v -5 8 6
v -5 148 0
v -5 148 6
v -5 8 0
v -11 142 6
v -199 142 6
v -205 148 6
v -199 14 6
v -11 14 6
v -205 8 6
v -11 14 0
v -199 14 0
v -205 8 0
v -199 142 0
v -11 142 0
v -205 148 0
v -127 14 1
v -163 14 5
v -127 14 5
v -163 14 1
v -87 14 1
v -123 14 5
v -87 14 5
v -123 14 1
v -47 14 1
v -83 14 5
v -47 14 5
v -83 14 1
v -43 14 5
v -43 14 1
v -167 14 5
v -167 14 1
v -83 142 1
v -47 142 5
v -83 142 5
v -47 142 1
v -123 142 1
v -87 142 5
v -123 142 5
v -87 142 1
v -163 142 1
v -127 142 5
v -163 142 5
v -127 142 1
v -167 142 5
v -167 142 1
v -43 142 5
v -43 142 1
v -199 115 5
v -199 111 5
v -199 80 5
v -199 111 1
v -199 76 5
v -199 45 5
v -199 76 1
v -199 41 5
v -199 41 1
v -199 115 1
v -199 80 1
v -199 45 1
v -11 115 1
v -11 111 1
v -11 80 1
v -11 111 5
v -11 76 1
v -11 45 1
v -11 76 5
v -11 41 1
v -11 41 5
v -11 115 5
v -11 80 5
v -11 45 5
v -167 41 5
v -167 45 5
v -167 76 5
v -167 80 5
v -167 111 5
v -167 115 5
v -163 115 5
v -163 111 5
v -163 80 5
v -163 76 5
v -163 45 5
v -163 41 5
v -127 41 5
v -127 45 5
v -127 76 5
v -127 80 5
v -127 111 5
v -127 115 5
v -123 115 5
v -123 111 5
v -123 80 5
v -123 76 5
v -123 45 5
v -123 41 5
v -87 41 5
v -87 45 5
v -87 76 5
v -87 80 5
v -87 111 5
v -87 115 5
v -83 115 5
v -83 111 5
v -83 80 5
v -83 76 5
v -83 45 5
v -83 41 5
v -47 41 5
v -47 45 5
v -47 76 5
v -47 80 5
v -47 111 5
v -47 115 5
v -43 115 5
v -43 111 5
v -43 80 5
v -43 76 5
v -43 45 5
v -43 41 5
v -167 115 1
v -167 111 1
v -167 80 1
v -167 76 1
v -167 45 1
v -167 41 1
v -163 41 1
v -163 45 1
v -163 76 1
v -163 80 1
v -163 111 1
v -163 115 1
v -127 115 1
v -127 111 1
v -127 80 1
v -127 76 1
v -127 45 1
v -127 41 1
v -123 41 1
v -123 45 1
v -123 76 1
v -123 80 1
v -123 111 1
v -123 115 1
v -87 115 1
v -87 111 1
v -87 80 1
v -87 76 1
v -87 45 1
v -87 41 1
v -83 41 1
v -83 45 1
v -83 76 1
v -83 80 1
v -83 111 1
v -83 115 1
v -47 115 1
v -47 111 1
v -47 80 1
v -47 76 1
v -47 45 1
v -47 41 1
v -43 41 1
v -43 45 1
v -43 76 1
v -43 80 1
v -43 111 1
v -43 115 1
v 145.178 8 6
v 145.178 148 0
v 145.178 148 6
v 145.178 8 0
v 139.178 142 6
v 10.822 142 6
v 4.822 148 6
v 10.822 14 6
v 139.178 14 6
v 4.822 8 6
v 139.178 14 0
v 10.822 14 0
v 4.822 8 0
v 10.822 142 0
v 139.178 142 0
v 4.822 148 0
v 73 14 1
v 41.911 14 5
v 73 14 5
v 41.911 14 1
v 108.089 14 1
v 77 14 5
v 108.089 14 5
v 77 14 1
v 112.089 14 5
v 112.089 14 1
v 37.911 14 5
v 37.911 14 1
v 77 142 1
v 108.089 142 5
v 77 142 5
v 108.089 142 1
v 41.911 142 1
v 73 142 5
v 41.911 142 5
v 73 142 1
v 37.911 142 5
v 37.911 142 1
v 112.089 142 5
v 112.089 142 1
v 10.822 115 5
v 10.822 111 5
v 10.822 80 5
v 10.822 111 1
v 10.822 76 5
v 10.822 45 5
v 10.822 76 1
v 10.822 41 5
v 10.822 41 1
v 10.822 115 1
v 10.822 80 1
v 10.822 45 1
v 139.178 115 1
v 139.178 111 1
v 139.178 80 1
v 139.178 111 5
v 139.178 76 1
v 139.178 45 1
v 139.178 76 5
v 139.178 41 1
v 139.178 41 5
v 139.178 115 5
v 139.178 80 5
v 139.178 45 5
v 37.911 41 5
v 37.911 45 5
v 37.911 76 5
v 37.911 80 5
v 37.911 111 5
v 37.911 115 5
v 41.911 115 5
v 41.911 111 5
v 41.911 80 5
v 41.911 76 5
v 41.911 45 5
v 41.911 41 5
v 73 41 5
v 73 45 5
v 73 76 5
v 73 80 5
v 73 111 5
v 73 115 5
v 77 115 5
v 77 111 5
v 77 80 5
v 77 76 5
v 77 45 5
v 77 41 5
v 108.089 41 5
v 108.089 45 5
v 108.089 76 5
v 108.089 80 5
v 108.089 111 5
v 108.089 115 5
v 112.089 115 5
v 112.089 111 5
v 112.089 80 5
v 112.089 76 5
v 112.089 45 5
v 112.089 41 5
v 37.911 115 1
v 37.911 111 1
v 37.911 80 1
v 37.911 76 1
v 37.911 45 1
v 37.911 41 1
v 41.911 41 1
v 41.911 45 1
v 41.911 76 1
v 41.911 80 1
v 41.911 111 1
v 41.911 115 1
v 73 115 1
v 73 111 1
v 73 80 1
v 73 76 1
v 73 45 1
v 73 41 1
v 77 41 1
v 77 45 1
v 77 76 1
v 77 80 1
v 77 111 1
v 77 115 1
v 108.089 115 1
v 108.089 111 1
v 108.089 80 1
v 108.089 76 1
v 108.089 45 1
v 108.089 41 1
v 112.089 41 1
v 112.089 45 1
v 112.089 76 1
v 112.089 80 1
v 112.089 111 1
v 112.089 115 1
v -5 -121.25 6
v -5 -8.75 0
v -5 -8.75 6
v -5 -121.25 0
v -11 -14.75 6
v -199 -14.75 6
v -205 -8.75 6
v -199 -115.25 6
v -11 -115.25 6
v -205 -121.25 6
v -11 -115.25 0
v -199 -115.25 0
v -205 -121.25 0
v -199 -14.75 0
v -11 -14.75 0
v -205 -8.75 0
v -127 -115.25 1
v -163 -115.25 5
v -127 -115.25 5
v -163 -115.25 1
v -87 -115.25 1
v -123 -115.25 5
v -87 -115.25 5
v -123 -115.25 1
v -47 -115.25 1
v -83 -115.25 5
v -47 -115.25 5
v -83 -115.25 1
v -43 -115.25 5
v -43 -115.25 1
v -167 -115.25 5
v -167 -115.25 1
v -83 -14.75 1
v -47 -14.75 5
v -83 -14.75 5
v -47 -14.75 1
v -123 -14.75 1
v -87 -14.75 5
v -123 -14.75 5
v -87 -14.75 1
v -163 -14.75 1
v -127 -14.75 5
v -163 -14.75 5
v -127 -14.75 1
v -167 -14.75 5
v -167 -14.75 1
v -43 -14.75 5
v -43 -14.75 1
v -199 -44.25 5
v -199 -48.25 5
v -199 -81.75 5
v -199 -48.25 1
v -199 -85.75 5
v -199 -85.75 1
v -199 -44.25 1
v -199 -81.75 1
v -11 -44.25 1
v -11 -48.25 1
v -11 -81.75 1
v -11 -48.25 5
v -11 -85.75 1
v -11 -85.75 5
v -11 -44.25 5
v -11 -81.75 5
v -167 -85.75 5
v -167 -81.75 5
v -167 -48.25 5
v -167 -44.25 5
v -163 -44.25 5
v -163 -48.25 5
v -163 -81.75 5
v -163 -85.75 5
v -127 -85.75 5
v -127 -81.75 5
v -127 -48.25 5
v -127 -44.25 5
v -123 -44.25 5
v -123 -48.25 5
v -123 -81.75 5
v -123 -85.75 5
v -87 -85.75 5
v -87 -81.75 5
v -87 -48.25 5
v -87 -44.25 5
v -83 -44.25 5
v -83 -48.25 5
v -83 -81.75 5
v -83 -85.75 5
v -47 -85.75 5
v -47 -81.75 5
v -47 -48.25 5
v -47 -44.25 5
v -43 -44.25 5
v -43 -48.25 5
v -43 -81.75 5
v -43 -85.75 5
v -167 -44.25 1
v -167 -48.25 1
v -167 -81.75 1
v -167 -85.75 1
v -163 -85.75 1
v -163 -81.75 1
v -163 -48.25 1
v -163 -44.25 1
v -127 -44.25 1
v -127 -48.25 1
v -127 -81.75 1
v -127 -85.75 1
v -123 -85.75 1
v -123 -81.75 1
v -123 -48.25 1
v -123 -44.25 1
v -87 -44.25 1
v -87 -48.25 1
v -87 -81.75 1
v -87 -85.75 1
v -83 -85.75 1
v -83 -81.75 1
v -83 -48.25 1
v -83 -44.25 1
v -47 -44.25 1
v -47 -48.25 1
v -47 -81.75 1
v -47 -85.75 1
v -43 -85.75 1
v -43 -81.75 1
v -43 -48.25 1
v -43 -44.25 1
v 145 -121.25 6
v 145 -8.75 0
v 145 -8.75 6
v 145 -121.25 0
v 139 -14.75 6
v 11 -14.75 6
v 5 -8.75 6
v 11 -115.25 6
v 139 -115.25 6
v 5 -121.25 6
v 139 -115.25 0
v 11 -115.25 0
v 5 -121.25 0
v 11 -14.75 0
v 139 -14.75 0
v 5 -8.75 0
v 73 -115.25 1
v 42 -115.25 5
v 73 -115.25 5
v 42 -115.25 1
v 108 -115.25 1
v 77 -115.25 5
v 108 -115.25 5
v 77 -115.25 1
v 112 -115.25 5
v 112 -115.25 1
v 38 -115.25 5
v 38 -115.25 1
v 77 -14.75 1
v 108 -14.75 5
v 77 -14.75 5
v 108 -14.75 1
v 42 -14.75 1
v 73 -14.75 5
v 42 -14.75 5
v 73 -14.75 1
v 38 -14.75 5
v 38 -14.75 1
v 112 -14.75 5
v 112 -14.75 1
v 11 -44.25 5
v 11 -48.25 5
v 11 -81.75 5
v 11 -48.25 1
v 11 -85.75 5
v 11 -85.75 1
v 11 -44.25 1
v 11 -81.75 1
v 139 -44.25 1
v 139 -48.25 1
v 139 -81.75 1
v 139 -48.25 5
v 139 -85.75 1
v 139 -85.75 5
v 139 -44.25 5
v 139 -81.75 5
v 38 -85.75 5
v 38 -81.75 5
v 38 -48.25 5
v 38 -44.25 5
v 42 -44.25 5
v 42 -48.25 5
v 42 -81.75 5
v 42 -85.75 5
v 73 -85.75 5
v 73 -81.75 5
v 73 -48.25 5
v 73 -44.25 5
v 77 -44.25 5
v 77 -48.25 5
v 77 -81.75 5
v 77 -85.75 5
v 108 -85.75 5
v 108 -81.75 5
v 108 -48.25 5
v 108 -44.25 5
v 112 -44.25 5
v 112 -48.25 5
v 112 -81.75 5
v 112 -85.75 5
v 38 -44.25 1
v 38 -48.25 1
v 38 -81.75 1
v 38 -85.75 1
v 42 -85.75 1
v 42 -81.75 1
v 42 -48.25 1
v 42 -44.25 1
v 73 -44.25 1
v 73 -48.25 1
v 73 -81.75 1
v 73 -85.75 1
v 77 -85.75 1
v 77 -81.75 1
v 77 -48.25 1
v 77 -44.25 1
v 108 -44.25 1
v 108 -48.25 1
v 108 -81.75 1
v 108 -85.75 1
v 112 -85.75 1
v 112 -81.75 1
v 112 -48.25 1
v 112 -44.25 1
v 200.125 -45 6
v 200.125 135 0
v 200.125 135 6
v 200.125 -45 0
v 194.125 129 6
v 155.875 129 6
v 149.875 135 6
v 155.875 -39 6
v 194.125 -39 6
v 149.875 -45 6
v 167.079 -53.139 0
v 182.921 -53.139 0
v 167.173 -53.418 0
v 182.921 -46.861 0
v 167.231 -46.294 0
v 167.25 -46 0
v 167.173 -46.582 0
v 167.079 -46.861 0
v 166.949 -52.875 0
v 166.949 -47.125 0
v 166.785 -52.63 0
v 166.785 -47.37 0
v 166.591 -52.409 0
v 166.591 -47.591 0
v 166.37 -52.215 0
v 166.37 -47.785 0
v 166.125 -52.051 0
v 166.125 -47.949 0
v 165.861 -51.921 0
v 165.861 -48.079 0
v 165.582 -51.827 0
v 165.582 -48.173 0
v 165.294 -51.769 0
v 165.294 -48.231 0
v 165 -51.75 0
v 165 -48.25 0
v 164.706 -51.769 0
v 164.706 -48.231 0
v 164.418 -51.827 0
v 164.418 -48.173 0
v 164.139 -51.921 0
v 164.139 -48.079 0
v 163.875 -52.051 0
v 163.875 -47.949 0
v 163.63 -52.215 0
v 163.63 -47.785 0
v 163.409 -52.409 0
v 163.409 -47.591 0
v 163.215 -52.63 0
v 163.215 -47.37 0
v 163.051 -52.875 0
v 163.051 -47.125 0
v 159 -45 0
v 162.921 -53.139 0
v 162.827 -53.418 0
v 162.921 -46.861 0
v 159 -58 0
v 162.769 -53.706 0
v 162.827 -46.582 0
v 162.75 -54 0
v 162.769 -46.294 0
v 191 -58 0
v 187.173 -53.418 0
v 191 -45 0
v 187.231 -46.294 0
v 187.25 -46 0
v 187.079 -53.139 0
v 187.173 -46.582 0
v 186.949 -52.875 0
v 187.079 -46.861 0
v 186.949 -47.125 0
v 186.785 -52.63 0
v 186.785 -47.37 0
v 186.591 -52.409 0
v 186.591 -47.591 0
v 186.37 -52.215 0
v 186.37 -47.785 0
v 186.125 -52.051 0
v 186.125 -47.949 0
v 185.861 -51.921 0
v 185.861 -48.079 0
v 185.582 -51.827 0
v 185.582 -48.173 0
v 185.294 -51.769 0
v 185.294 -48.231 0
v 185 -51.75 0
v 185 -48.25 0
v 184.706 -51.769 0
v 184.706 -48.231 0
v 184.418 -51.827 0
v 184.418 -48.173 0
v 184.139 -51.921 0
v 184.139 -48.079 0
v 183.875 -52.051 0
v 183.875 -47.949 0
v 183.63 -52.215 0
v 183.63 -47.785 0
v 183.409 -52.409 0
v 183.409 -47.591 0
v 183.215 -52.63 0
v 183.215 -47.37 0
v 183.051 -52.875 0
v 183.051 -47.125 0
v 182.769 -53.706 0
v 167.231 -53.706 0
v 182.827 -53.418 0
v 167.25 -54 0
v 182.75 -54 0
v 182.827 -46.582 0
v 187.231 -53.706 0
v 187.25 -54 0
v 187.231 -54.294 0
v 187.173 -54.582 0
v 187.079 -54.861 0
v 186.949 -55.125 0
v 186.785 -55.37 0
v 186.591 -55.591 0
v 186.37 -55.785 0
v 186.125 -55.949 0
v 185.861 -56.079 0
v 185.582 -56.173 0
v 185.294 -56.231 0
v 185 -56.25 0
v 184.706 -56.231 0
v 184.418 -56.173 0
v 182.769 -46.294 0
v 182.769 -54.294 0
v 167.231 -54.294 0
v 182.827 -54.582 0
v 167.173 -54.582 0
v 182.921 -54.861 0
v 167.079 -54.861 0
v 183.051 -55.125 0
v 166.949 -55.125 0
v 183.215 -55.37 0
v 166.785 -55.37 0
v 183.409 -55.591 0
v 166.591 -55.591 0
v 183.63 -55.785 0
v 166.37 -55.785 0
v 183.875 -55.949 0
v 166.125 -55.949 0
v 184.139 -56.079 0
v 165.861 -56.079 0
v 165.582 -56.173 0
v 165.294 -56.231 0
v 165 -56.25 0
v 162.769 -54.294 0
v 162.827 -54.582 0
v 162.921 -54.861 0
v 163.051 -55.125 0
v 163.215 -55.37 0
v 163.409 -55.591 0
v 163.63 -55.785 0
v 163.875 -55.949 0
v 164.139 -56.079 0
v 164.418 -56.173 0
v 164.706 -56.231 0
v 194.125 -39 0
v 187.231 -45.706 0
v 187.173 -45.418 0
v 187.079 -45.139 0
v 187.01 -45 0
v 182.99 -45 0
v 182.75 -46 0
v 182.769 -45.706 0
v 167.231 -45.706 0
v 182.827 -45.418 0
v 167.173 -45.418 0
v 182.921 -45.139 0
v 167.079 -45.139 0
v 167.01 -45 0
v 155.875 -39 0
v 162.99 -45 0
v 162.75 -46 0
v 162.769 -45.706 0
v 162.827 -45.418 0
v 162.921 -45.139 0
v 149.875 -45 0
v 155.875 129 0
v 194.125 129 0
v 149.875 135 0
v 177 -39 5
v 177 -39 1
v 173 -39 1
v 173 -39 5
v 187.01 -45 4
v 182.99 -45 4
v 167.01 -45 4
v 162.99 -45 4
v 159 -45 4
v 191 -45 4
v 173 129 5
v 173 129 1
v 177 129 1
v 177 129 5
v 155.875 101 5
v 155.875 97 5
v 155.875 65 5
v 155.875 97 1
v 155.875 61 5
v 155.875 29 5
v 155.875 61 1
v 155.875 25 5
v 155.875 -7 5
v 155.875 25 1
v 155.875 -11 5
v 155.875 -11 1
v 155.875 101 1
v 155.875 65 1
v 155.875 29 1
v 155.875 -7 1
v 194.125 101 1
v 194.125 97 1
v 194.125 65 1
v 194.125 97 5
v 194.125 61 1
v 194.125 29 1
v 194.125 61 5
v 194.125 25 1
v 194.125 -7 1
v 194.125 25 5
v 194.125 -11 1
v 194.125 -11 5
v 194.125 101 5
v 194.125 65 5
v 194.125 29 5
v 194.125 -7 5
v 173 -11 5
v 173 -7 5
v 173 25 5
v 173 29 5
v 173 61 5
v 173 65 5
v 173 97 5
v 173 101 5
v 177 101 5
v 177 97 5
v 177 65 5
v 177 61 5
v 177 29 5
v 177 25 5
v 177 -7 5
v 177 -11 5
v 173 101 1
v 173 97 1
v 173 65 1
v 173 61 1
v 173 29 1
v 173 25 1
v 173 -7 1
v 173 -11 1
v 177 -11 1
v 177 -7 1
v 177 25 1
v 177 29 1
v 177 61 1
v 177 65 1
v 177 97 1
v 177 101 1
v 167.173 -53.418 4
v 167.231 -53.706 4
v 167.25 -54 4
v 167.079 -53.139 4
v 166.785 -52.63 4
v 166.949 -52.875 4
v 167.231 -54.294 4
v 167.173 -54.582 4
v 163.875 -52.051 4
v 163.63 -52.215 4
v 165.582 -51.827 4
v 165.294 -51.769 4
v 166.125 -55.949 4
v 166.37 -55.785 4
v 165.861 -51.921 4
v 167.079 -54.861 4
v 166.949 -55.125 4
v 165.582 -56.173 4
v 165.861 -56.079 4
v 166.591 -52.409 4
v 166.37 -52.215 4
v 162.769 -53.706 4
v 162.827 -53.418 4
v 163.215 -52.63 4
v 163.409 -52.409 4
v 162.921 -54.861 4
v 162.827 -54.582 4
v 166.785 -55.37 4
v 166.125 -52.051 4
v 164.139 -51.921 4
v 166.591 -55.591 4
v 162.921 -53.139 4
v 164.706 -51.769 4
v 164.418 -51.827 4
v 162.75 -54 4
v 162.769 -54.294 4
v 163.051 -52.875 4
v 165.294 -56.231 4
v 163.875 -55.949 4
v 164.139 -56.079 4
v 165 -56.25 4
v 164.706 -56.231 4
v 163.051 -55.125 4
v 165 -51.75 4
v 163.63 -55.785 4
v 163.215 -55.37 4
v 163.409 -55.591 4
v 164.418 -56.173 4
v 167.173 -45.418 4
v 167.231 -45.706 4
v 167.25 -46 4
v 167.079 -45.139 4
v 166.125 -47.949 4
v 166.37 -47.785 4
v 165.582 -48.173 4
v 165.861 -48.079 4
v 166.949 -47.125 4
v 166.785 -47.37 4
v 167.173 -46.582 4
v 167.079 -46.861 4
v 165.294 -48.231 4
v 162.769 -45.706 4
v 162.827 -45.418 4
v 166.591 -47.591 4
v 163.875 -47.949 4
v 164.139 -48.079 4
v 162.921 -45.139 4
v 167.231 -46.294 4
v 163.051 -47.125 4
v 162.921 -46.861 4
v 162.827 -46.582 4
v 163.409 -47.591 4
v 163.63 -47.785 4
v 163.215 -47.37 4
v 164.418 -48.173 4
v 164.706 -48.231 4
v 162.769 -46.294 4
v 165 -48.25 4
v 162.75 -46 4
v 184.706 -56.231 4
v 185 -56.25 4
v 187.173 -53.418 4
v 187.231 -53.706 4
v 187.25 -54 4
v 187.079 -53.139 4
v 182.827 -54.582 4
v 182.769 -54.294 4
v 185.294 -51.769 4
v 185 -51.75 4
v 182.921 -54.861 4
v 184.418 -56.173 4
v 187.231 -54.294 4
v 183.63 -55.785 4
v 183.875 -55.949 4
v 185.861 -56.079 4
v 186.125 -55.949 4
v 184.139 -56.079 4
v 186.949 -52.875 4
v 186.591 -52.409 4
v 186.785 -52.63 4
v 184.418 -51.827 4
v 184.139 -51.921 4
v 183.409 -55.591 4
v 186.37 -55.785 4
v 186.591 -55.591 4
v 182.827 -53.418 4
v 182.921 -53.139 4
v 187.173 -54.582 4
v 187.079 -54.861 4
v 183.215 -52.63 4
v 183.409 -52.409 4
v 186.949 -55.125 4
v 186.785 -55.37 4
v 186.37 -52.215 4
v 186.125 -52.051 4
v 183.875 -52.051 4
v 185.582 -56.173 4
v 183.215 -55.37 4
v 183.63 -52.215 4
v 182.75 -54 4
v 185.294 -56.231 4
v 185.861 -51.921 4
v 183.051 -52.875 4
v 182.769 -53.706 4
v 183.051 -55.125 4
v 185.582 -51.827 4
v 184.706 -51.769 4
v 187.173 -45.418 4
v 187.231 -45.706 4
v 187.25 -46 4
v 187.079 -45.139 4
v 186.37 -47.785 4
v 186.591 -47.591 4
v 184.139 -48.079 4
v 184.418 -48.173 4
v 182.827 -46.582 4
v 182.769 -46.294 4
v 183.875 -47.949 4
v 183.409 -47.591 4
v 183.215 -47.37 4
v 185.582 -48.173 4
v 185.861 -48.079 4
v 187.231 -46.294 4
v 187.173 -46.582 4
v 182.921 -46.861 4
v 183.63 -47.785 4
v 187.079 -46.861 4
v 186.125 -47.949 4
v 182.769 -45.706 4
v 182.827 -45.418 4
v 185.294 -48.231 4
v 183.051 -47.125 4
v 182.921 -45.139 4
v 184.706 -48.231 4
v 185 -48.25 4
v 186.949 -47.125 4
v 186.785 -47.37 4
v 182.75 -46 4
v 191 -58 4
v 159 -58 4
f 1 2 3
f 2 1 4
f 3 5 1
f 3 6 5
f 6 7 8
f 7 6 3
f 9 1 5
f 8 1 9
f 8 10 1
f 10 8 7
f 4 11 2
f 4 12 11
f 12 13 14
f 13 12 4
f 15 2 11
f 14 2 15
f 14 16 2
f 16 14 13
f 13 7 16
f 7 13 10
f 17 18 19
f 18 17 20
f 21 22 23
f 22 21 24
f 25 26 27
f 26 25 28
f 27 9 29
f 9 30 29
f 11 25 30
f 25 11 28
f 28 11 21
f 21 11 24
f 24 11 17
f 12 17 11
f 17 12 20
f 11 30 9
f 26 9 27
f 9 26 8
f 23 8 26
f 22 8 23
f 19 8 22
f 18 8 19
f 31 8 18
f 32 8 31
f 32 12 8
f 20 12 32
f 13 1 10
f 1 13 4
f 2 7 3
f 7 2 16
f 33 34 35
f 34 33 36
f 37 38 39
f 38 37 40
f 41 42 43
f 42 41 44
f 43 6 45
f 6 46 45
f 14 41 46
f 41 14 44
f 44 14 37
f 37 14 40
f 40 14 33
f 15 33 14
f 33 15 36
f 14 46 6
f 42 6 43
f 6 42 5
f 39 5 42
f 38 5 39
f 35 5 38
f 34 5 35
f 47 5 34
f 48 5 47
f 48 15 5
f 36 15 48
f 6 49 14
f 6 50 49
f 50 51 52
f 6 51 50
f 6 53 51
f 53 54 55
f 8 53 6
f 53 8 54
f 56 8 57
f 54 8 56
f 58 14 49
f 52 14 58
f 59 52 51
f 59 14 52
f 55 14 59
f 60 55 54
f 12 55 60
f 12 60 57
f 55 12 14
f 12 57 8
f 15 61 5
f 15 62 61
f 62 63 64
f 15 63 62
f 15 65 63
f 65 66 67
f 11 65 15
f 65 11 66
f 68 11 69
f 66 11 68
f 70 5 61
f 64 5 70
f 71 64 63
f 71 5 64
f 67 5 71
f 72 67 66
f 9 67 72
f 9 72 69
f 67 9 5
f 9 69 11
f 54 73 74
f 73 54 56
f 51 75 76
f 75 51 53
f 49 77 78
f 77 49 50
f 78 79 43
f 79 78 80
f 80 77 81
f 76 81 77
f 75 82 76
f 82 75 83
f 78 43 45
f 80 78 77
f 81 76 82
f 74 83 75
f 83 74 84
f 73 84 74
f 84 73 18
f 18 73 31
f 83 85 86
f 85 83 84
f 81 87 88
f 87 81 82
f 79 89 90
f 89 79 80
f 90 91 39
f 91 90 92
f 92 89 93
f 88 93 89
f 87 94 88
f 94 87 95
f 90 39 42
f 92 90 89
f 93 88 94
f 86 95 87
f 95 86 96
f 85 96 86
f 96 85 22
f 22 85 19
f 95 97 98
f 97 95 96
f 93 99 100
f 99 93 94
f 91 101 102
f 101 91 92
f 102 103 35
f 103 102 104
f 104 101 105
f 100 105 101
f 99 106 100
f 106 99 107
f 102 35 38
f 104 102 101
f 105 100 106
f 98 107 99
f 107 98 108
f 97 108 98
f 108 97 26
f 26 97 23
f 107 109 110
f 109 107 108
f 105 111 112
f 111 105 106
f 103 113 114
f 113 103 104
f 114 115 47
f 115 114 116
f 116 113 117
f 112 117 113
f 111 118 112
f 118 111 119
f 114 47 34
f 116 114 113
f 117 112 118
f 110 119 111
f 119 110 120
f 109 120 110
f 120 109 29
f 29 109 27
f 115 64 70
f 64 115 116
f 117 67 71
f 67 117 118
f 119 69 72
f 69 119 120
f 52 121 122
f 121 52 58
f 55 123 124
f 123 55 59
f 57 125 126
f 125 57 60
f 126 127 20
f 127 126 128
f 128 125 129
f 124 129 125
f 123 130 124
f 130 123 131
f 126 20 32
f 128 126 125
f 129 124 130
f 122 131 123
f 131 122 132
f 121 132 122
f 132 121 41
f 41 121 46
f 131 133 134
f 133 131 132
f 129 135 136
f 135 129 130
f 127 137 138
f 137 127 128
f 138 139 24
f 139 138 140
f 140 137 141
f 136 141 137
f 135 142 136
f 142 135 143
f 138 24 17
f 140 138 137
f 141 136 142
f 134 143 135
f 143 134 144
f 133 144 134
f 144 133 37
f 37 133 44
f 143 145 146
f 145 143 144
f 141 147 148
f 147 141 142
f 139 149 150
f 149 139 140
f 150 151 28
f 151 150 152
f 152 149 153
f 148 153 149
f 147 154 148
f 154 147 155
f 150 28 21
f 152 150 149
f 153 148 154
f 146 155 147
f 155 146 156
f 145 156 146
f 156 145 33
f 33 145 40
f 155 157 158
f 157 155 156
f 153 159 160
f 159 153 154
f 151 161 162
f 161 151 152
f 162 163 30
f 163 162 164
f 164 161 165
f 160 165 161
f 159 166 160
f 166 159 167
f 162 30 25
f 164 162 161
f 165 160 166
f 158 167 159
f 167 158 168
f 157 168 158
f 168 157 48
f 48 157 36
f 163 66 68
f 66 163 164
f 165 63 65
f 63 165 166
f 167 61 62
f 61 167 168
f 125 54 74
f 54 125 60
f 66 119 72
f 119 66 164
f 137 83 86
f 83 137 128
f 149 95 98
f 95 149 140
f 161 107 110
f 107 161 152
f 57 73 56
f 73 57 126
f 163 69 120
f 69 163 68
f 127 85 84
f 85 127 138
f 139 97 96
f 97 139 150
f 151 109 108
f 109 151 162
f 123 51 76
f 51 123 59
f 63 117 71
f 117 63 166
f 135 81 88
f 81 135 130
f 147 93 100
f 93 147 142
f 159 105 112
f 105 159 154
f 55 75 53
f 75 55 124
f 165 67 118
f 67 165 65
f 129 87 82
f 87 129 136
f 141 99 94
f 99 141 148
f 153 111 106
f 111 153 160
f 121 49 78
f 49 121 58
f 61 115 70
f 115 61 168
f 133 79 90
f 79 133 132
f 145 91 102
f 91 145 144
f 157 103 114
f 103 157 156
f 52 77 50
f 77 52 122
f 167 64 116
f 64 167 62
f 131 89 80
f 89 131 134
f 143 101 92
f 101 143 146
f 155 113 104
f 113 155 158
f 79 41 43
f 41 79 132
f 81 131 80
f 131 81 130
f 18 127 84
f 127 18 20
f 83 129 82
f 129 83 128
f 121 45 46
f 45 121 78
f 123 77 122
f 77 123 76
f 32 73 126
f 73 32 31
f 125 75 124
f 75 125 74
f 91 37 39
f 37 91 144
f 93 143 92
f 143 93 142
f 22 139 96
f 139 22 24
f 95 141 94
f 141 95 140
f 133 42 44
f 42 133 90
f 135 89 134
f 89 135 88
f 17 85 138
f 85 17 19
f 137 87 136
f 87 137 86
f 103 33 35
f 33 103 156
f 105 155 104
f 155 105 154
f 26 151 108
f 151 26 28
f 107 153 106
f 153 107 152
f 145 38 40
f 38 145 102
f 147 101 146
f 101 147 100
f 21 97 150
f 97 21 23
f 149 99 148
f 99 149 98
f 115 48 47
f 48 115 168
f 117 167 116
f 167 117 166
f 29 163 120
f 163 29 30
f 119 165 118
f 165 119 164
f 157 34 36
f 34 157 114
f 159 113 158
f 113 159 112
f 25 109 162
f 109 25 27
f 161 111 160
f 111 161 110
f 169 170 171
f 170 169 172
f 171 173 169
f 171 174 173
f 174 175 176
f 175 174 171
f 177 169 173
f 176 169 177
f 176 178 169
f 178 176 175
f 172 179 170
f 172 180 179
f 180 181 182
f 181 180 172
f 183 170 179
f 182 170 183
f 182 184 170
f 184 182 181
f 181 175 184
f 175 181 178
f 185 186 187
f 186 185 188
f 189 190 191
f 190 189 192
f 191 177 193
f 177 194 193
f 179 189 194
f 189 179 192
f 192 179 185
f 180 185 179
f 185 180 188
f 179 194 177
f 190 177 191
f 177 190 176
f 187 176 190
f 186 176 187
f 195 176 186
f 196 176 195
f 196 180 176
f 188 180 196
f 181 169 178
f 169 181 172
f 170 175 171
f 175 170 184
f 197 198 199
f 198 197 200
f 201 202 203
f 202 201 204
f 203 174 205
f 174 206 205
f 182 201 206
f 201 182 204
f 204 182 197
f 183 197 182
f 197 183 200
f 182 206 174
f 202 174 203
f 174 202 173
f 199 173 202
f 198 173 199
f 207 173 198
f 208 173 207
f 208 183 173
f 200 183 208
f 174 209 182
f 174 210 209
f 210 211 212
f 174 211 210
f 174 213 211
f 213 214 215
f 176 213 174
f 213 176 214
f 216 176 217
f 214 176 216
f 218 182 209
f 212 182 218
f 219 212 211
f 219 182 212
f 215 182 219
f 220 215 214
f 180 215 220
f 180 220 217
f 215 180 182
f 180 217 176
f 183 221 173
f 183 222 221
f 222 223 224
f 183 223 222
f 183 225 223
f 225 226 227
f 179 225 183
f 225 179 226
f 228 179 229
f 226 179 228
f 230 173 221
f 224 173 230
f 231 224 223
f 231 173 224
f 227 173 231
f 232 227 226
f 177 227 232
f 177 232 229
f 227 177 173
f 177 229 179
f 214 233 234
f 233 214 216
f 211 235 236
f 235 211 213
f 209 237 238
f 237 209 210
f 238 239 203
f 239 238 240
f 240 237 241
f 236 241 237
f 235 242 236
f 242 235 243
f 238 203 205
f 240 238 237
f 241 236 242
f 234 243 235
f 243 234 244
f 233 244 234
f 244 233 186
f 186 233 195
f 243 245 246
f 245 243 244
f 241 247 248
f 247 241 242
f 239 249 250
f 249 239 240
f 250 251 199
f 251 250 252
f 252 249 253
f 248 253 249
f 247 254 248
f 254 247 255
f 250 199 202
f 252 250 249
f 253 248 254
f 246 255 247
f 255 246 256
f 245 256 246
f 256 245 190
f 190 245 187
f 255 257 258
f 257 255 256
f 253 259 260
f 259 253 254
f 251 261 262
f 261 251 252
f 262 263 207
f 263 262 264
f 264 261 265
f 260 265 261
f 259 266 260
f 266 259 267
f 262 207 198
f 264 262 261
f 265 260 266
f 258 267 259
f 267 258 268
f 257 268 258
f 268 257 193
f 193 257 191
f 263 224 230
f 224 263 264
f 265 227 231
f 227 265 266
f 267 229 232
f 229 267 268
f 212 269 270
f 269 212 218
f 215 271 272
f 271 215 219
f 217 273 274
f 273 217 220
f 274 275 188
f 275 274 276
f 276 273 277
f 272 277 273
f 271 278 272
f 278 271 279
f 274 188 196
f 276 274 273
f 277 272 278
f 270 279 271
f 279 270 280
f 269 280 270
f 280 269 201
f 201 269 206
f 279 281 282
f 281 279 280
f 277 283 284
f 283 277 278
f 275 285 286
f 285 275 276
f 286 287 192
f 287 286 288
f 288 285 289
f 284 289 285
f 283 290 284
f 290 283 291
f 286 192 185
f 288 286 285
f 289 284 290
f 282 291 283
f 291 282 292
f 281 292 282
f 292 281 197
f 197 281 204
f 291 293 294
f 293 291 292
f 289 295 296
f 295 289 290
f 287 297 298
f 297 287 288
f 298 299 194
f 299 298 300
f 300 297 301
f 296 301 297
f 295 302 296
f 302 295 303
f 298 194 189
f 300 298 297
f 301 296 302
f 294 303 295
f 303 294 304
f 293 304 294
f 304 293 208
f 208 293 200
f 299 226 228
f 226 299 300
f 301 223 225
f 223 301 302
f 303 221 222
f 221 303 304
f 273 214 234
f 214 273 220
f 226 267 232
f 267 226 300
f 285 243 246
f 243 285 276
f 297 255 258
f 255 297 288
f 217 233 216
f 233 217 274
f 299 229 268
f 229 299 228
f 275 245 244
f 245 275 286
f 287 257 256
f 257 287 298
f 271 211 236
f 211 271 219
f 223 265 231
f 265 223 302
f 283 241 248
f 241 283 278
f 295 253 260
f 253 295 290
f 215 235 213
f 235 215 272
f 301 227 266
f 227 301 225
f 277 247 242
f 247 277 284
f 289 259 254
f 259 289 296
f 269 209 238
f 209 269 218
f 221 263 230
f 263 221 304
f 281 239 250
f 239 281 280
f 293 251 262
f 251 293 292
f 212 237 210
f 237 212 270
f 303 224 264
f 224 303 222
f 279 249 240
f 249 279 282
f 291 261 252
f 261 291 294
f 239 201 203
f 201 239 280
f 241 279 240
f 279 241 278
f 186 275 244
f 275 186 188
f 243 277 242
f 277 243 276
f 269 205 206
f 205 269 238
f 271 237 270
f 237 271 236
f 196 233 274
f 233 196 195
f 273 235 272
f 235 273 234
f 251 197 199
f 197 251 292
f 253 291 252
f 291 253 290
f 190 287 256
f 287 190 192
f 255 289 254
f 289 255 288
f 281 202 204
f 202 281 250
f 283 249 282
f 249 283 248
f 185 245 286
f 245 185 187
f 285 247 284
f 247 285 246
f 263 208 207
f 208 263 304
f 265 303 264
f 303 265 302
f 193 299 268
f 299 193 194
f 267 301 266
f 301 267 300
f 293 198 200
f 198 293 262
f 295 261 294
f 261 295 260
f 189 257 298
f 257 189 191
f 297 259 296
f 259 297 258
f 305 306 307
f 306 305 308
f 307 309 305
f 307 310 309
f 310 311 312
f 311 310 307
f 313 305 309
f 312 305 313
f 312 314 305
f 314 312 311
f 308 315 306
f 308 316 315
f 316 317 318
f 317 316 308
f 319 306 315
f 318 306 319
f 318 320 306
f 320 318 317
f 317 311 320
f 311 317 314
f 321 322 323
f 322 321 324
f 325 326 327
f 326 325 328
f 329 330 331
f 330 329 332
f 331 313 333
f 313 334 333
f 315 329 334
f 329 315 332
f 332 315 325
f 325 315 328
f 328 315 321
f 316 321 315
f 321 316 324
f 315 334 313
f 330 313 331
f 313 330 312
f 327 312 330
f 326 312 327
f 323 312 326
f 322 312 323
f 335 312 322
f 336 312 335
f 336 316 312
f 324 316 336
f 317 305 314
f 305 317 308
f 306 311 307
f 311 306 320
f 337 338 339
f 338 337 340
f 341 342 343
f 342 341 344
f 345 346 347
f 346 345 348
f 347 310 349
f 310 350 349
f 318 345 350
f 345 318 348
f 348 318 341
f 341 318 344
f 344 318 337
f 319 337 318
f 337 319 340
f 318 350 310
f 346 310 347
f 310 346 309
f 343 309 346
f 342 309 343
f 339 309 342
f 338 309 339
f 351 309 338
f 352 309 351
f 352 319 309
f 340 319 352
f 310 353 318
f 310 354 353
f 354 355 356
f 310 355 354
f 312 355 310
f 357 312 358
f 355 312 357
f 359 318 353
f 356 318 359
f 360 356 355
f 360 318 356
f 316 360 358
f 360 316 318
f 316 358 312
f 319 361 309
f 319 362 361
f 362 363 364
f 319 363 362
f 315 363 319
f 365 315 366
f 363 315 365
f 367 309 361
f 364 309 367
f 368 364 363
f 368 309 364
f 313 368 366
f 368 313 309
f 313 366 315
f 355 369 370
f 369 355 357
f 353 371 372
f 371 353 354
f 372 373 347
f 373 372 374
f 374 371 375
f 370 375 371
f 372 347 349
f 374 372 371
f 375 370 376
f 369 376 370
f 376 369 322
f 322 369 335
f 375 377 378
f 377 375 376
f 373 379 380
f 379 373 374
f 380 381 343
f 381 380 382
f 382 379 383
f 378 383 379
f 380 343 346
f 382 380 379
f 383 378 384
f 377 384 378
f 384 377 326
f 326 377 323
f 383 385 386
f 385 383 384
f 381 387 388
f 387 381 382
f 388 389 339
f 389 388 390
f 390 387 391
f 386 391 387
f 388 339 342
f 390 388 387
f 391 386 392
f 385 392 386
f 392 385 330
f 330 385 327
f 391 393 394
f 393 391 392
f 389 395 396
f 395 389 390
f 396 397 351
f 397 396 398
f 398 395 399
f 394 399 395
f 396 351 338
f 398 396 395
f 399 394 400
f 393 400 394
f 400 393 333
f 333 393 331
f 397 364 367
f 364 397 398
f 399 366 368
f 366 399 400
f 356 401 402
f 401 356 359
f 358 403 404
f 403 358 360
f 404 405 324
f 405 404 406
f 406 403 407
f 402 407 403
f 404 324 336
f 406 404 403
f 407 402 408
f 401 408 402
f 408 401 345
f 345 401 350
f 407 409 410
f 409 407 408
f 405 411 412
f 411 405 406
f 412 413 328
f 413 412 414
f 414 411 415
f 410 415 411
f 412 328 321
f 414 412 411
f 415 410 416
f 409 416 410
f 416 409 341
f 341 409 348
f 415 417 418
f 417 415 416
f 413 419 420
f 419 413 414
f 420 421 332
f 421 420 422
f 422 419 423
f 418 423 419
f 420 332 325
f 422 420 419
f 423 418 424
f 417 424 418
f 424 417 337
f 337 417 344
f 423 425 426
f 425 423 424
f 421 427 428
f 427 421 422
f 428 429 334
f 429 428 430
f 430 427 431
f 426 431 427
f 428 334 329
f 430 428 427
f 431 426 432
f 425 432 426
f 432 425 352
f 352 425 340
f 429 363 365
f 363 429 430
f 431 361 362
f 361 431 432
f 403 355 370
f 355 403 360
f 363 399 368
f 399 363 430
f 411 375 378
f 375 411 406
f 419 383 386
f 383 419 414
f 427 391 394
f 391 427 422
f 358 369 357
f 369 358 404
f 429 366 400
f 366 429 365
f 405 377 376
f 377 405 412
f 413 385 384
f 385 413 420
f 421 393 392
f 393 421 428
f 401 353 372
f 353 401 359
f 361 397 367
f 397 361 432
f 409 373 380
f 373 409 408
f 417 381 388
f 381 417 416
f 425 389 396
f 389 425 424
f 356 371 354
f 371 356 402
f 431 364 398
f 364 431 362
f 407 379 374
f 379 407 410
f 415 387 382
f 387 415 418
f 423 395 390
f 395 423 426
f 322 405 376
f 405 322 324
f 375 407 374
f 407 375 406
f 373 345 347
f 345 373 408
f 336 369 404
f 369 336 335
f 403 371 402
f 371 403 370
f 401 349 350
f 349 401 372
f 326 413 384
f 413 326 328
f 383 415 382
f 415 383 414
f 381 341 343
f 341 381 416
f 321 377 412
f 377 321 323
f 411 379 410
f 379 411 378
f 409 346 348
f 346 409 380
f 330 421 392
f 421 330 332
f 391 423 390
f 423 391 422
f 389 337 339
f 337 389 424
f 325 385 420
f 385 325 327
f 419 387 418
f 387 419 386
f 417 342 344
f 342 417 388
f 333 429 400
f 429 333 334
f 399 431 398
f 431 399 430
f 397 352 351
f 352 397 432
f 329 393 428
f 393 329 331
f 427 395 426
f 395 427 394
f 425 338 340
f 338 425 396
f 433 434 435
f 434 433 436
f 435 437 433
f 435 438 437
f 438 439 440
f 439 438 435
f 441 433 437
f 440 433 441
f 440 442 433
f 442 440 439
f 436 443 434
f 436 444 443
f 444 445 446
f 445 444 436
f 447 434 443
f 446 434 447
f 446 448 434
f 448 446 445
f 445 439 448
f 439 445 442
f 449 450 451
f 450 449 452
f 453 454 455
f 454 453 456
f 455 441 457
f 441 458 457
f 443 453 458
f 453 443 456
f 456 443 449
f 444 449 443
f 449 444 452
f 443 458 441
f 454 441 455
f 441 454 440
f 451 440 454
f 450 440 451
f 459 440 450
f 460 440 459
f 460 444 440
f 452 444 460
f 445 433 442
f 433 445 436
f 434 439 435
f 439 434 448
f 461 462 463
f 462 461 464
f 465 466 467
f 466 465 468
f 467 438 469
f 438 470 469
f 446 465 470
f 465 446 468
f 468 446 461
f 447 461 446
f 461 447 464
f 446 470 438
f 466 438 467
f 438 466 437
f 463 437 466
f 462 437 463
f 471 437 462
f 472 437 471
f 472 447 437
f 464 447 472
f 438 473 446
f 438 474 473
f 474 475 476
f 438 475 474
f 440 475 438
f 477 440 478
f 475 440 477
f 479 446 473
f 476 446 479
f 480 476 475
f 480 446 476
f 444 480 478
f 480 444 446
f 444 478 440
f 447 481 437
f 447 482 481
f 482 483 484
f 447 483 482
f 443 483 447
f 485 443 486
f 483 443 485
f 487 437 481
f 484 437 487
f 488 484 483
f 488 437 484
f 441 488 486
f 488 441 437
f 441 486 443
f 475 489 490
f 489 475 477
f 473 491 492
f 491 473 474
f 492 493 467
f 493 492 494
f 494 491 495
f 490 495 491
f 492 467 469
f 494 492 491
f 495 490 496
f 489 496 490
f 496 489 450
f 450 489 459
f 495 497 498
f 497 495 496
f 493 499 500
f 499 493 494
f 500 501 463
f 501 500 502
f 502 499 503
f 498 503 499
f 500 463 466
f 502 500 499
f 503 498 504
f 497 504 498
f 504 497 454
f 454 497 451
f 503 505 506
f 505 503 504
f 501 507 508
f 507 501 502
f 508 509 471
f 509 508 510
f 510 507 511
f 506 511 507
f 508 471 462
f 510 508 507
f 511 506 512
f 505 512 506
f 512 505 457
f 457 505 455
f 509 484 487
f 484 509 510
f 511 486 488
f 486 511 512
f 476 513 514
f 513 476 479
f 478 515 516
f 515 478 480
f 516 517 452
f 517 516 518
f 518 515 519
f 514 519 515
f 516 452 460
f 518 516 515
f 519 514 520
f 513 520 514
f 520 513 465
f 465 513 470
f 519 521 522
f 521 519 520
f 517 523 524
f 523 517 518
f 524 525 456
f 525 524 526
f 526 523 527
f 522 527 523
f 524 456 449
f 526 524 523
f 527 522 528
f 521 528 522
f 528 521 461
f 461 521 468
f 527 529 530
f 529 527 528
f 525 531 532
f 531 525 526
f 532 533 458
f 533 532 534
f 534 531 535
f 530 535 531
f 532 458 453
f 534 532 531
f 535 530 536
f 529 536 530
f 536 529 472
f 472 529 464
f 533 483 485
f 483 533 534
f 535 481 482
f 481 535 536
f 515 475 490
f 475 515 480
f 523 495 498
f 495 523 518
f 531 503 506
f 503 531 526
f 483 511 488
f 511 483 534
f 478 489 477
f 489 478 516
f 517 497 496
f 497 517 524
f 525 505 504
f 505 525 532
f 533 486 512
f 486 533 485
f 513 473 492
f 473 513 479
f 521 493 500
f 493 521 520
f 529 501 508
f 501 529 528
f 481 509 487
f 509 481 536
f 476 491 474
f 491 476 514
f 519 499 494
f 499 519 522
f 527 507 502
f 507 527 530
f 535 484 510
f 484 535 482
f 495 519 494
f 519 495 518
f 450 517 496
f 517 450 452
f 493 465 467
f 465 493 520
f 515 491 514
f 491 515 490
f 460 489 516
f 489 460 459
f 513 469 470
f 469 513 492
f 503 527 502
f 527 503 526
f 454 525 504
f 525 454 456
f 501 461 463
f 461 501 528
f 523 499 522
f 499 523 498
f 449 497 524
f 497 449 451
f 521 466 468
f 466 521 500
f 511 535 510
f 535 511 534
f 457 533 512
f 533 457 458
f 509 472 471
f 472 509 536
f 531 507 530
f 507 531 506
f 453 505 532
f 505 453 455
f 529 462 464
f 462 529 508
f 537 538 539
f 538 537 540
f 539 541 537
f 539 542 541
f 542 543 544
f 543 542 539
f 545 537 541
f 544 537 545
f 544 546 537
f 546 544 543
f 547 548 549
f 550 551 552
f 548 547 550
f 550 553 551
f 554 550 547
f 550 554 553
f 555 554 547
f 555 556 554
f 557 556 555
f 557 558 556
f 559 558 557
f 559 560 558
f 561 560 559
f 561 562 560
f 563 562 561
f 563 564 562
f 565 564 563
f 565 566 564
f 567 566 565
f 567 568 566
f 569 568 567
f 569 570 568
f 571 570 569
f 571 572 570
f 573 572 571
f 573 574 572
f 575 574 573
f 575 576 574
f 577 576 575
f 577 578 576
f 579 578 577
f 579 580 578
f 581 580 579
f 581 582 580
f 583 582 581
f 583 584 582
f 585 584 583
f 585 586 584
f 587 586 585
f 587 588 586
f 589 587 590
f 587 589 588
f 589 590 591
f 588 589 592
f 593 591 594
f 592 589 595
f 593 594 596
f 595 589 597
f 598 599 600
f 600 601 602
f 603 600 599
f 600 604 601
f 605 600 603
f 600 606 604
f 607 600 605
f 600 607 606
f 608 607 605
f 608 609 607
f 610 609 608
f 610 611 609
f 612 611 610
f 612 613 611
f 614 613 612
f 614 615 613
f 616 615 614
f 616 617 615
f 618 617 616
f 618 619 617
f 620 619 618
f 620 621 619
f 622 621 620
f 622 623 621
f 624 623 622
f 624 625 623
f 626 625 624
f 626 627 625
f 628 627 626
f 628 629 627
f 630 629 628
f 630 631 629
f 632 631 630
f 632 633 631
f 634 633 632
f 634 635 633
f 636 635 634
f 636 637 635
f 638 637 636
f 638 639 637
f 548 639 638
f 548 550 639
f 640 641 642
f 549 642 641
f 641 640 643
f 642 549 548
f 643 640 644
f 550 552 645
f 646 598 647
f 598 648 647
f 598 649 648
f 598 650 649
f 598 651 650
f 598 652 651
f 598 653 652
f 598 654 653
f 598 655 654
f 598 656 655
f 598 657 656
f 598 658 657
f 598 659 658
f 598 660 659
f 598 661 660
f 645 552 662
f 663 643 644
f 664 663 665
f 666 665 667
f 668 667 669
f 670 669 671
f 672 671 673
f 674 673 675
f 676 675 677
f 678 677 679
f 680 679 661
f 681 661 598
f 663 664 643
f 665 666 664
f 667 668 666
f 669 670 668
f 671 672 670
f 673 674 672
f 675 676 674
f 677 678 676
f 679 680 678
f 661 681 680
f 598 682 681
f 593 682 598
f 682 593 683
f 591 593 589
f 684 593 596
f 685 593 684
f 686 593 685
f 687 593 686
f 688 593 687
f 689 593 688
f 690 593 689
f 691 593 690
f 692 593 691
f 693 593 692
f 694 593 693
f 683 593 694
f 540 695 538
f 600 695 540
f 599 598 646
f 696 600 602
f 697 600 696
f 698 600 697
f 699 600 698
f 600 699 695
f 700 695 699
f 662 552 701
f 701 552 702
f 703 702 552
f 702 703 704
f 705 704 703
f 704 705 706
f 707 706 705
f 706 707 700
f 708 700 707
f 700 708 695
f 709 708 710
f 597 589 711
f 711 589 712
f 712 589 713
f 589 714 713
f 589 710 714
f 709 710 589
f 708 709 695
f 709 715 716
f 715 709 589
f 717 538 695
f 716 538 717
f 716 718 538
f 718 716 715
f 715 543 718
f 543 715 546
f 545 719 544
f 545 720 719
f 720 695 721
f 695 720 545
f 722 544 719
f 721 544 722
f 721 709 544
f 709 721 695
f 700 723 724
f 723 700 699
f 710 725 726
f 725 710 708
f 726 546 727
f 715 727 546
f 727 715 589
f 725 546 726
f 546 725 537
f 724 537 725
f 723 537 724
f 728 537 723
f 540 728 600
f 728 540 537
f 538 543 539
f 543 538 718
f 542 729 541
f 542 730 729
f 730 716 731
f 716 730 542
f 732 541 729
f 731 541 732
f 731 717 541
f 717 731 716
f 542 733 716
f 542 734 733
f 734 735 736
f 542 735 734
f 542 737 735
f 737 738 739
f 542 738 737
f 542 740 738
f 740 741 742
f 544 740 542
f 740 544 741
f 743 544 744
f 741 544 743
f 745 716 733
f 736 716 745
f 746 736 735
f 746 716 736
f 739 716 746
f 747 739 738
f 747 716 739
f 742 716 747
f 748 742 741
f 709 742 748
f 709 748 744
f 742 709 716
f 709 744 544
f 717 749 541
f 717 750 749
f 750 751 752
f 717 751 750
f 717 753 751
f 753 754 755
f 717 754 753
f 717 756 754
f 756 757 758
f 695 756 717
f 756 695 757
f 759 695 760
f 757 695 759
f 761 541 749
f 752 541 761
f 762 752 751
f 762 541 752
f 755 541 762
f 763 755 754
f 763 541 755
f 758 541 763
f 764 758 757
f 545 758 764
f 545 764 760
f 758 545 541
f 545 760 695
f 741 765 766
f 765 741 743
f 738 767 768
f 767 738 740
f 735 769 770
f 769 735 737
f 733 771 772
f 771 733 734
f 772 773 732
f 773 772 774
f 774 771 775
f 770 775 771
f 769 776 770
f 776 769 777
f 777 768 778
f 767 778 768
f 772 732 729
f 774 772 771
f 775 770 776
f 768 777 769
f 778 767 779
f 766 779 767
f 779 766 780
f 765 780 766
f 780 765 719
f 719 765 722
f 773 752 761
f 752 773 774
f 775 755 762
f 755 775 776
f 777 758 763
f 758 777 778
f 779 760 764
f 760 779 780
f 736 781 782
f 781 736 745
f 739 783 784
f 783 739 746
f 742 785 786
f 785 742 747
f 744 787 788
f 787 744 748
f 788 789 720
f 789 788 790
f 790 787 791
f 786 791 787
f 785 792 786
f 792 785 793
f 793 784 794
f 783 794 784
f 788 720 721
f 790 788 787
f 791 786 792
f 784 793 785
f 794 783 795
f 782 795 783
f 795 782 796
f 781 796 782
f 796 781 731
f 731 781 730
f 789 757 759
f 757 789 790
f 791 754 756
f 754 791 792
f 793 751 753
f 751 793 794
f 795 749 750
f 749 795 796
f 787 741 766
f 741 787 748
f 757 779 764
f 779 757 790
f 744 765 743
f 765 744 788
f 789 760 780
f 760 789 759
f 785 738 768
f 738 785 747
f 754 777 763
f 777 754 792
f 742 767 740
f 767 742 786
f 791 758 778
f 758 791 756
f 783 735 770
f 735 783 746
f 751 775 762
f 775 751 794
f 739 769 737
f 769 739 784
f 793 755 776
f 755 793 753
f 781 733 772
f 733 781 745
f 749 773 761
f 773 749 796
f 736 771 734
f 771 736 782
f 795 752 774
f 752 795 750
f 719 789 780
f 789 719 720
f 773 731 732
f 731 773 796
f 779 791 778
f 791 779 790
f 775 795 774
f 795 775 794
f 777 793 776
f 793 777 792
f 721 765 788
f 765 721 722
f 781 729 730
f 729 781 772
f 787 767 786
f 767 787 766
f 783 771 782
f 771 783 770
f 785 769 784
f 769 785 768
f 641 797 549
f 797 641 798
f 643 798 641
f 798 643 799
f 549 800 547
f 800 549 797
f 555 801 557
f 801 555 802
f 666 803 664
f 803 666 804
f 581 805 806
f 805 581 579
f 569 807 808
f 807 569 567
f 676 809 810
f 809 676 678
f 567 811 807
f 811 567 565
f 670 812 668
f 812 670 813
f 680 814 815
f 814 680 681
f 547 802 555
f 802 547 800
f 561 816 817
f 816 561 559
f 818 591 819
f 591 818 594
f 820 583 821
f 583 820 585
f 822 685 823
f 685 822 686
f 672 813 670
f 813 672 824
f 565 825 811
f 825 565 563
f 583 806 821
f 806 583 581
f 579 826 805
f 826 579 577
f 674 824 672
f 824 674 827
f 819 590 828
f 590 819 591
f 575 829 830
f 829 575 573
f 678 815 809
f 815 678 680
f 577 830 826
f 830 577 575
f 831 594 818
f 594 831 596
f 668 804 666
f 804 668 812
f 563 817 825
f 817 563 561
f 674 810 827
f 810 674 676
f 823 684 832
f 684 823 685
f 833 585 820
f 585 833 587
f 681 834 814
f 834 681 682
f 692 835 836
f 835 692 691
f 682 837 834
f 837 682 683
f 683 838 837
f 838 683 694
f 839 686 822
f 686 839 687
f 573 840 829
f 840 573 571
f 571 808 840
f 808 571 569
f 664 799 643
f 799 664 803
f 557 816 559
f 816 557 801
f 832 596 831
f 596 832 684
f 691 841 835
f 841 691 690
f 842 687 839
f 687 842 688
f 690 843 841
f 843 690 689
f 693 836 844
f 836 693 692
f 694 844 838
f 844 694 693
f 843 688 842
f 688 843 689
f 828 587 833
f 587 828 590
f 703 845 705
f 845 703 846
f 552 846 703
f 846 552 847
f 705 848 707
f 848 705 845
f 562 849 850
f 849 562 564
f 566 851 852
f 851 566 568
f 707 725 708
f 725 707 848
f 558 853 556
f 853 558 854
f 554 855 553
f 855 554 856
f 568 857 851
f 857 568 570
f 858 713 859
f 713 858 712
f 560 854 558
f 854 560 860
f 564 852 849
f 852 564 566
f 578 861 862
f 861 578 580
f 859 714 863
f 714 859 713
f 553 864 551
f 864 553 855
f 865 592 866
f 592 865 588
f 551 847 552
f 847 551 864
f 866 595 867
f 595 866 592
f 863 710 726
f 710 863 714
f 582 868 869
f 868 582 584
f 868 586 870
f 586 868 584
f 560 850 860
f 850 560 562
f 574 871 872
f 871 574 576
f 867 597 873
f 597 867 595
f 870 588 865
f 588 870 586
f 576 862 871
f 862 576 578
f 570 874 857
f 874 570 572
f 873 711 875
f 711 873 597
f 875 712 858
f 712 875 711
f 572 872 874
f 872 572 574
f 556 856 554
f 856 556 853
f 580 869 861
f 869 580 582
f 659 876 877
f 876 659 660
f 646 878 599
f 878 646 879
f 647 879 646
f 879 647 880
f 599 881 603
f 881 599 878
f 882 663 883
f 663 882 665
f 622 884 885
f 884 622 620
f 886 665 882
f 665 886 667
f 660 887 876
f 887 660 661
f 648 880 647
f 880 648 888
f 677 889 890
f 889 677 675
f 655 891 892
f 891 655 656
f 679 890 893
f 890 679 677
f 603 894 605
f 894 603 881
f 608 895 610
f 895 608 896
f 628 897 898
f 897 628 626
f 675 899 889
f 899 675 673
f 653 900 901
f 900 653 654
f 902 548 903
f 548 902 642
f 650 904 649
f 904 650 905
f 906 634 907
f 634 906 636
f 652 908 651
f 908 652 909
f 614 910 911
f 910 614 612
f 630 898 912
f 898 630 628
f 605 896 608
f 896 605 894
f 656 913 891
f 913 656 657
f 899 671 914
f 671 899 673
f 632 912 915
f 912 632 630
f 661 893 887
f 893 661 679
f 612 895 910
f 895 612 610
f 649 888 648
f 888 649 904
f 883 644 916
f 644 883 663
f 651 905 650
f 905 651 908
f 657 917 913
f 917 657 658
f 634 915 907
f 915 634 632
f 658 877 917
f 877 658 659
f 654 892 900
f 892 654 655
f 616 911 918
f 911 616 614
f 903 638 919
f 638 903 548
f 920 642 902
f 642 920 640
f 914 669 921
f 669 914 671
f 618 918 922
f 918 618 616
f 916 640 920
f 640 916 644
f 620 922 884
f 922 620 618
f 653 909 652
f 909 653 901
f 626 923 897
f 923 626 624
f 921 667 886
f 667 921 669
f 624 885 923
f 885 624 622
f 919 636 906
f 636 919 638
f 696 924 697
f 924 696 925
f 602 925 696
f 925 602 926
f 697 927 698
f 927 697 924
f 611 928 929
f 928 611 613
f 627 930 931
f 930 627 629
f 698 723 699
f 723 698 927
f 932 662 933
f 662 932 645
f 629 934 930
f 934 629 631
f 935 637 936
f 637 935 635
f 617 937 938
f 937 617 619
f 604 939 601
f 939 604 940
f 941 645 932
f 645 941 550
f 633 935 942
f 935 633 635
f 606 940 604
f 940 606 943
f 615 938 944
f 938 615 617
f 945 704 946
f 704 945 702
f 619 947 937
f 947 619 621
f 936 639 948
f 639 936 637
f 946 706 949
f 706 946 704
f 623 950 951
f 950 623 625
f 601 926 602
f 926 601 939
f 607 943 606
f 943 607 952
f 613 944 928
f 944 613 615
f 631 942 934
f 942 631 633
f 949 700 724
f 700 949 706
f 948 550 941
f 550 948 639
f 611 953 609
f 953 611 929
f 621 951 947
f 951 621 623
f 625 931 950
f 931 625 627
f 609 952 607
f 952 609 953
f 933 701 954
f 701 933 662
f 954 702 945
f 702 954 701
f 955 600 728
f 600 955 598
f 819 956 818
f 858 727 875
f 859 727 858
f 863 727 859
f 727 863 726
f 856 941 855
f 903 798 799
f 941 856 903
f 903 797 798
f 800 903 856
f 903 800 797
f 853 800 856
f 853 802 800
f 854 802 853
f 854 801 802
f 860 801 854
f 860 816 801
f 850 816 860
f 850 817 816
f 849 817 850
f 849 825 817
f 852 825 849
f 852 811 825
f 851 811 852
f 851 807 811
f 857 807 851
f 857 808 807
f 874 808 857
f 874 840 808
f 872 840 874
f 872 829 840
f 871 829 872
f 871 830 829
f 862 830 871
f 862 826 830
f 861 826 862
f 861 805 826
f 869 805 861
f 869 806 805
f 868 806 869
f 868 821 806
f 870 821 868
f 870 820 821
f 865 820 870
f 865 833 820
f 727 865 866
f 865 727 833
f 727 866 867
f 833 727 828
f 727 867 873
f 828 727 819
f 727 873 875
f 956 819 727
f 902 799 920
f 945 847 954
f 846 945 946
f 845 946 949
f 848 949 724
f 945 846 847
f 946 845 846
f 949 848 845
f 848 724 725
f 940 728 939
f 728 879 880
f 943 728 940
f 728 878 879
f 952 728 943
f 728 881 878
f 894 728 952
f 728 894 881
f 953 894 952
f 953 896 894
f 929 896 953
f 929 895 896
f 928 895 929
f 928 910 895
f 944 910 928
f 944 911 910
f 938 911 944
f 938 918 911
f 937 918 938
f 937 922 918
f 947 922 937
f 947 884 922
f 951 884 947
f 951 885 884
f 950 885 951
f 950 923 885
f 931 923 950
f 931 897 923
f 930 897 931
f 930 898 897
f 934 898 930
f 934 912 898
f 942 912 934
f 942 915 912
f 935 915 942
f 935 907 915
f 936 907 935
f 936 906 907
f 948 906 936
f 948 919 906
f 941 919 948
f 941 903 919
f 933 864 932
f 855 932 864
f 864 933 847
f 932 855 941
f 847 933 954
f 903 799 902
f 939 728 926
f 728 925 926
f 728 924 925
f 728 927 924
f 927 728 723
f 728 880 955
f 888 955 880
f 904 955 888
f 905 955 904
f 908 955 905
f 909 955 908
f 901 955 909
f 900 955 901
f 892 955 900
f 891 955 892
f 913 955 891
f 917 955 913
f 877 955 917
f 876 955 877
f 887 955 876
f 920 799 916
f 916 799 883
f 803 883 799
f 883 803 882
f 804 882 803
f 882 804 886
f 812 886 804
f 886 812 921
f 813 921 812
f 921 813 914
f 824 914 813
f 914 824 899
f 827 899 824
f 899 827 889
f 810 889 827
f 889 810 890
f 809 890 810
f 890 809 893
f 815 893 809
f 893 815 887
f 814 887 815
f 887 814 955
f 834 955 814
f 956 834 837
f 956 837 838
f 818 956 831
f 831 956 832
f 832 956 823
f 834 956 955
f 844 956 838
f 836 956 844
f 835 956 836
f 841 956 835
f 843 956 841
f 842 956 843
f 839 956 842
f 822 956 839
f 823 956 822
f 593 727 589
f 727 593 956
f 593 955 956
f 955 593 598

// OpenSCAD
// file: lib.scad
// Wire-mesh panel primitives for the basket weldment.
include <params.scad>

// Flat mesh panel in the local XY plane, centered at the origin.
// Perimeter uses frame_d rod, infill uses wire_d at <= mesh_pitch spacing.
// Top face of the panel sits at z = 0 (rods hang below it) so callers can
// position panels by their working surface.
module mesh_panel(lx, ly) {
    nx = max(1, ceil(lx / mesh_pitch));
    ny = max(1, ceil(ly / mesh_pitch));
    translate([0, 0, -frame_d / 2]) {
        // perimeter frame
        for (sy = [-1, 1])
            translate([0, sy * (ly - frame_d) / 2, 0])
                cube([lx, frame_d, frame_d], center = true);
        for (sx = [-1, 1])
            translate([sx * (lx - frame_d) / 2, 0, 0])
                cube([frame_d, ly, frame_d], center = true);
        // infill wires along x
        for (i = [1 : ny - 1])
            translate([0, -ly / 2 + i * ly / ny, 0])
                cube([lx, wire_d, wire_d], center = true);
        // infill wires along y
        for (i = [1 : nx - 1])
            translate([-lx / 2 + i * lx / nx, 0, 0])
                cube([wire_d, ly, wire_d], center = true);
    }
}

// Vertical mesh wall in the local XZ plane (length lx, height hz),
// centered in x, base at z = 0, panel mid-plane at y = 0.
module mesh_wall(lx, hz) {
    translate([0, 0, hz / 2])
        rotate([90, 0, 0])
            mesh_panel(lx, hz);
}

// U-shaped carry handle in the local XZ plane: span in x, rising +z.
module handle(span, rise, rod = 8) {
    for (sx = [-1, 1])
        translate([sx * span / 2, 0, rise / 2])
            cube([rod, rod, rise], center = true);
    translate([0, 0, rise - rod / 2])
        cube([span + rod, rod, rod], center = true);
}
// file: params.scad
// Basket bin v2.1 + entry hood — validated dimensions.
//
// Single source of truth for every file in this directory.
// All values in mm, GROUND frame (z=0 at court surface), robot +x forward.
// Sources: docs/basket-bin-redesign-spec-el.md,
//          ros2_ws/src/tennis_robot/urdf/components/basket.urdf.xacro,
//          debug log #45-#56 (docs/intake-debug-log-el.md).
// Do not change a value here without re-validating in the Gazebo bench.

// ---- Bin interior (spec §2) ----
bin_rear_x       = 20;    // rear interior plane
bin_front_x      = 420;   // front interior plane = retention boundary
bin_half_width   = 140;   // interior half width (280 total)
floor_top_z      = 25;    // sunken floor top (20 mm ground clearance below)
floor_thickness  = 5;
wall_top_z       = 250;   // rim height (below lidar plane 498)
wall_thickness   = 10;    // effective wall envelope in sim

// ---- Load-management tray (spec §2, log #54 low_transition) ----
mgmt_run         = 140;   // rear edge x = bin_front_x - mgmt_run = 280
mgmt_rise        = 10;    // tray top: 25 @ x280 -> 35 @ x420 (~4.1 deg)

// ---- Receiving chute (spec §2) ----
recv_run         = 50;    // x 420 -> 470
recv_rise        = 5;     // top: 35 @ x420 -> 40 @ x470
recv_half_width  = 90;    // 180 mm launch channel

// ---- Front retention (log #51/#52) ----
entry_half_width = 90;    // launch opening half width
guard_height     = 20;    // corner guards, z 25..45, y 90..140 each side
center_lip_height = 10;   // fixed centre lip, z 25..35 (log #52 -> low-transition)

// ---- Entry hood (log #54-#56, now sim default) ----
hood_rear_overhang    = 40;   // roof rear x = bin_front_x - 40 = 380
hood_rear_clearance_z = 120;  // roof underside @ rear edge
hood_front_clearance_z = 135; // roof underside @ front edge (x 470)
hood_cheek_thickness  = 5;

// ---- Wire mesh construction (spec §2: hopper-style mesh) ----
wire_d     = 4;    // mesh wire
frame_d    = 6;    // panel perimeter rod
mesh_pitch = 40;   // grid opening <= 40 (ball 66 cannot pass)

// ---- Chassis context (reference only, spec §3-§4) ----
plate_top_z     = 52;
plate_thickness = 14;
plate_half_len  = 460;   // 920 x 580 chassis
plate_half_wid  = 290;
open_rear_x     = 10;    // plate opening x 10..460, y +/-150
open_front_x    = 460;
open_half_wid   = 150;
flange_width    = 22;    // bin rests on this ring, on the plate top
flange_thickness = 4;

// ---- Sensors / references ----
ir_x       = 445;   // confirmation beam through the chute midpoint
ir_z       = 70.5;
ir_mount_y = 155;   // sensor bodies on the chassis, outside the bin
ball_d     = 66;

// Battery bay (spec §4): 198 x 166 x 170, x -226..-60, centered in y
batt_size  = [166, 198, 170];
batt_min_x = -226;

// Derived (do not edit)
bin_length   = bin_front_x - bin_rear_x;           // 400
wall_height  = wall_top_z - floor_top_z;           // 225
mgmt_rear_x  = bin_front_x - mgmt_run;             // 280
mgmt_angle   = atan2(mgmt_rise, mgmt_run);         // ~4.09 deg
recv_front_x = bin_front_x + recv_run;             // 470
recv_angle   = atan2(recv_rise, recv_run);         // ~5.71 deg
recv_rear_top_z = floor_top_z + mgmt_rise;         // 35
recv_mid_z   = recv_rear_top_z + recv_rise / 2;    // 37.5
hood_rear_x  = bin_front_x - hood_rear_overhang;   // 380
hood_run     = recv_front_x - hood_rear_x;         // 90
hood_rise    = hood_front_clearance_z - hood_rear_clearance_z; // 15
hood_angle   = atan2(hood_rise, hood_run);         // ~9.46 deg
// roof underside height at the cheek midpoint (x = ir_x), xacro hood_side_top_z
hood_side_top_z = hood_rear_clearance_z
    + hood_rise * (ir_x - hood_rear_x) / hood_run; // ~130.8
// main file
// 220 x 220 mm print-bed segments for basket bin v2.1.
//
// Select one part on the command line, for example:
//   openscad -D 'part="floor_tile"' -o floor_tile.stl print-segments.scad
//
// The quantity required for a complete basket is documented in README.md.
// Panels are exported flat, with their lowest face at z=0. Adjacent perimeter
// frames can be lashed together with zip ties, or with the joiner_plate part.

include <params.scad>
use <lib.scad>

part = "layout";
$fn = 48;

floor_tile_x = bin_length / 2;       // 200 mm
floor_tile_y = bin_half_width;       // 140 mm
tray_tile_x = sqrt(mgmt_run ^ 2 + mgmt_rise ^ 2);
tray_tile_y = bin_half_width;        // 140 mm
side_tile_x = bin_length / 2;        // 200 mm
side_tile_y = wall_height / 2;       // 112.5 mm
rear_tile_x = bin_half_width;        // 140 mm
rear_tile_y = wall_height / 2;       // 112.5 mm
chute_tile_x = sqrt(recv_run ^ 2 + recv_rise ^ 2);
rear_flange_segment_length = (2 * (open_half_wid + flange_width)) / 2;

module printable_panel(lx, ly) {
    // mesh_panel() has its top at z=0; lift it onto the print bed.
    translate([0, 0, frame_d]) mesh_panel(lx, ly);
}

module floor_tile() {
    printable_panel(floor_tile_x, floor_tile_y);
}

module management_tray_tile() {
    printable_panel(tray_tile_x, tray_tile_y);
}

module side_wall_tile() {
    printable_panel(side_tile_x, side_tile_y);
}

module rear_wall_tile() {
    printable_panel(rear_tile_x, rear_tile_y);
}

module receiving_chute_tile() {
    printable_panel(chute_tile_x, 2 * recv_half_width);
}

module side_flange_segment() {
    translate([0, 0, flange_thickness / 2])
        cube([bin_length / 2, flange_width, flange_thickness], center = true);
}

module rear_flange_segment() {
    translate([0, 0, flange_thickness / 2])
        cube([rear_flange_segment_length, flange_width,
              flange_thickness], center = true);
}

module corner_guard() {
    // Lay the original 10 x 50 x 20 mm guard on its broad face.
    translate([0, 0, wall_thickness / 2])
        cube([bin_half_width - entry_half_width, guard_height,
              wall_thickness], center = true);
}

module center_lip() {
    translate([0, 0, center_lip_height / 2])
        cube([2 * entry_half_width, wall_thickness,
              center_lip_height], center = true);
}

module carry_handle() {
    // The handle is modelled in XZ. Rotate it onto the bed for printing.
    translate([0, 0, 4]) rotate([90, 0, 0]) handle(120, 35);
}

module drop_strut() {
    translate([0, 0, frame_d / 2])
        cube([wall_thickness, frame_d, frame_d], center = true);
}

module joiner_plate() {
    // General-purpose lashing plate. Four 4.5 mm holes accept common zip ties
    // or M4 hardware; use one plate on each side for a bolted clamp.
    difference() {
        translate([0, 0, 2]) cube([32, 16, 4], center = true);
        for (x = [-10, 10], y = [-4, 4])
            translate([x, y, -1]) cylinder(d = 4.5, h = 6);
    }
}

module printable_layout() {
    // Visual index only; export named parts separately for slicing.
    translate([-105,  78, 0]) floor_tile();
    translate([  75,  78, 0]) management_tray_tile();
    translate([-105, -65, 0]) side_wall_tile();
    translate([  75, -65, 0]) rear_wall_tile();
    translate([ 175,  45, 0]) receiving_chute_tile();
    translate([ 175, -50, 0]) joiner_plate();
}

if (part == "floor_tile") floor_tile();
else if (part == "management_tray_tile") management_tray_tile();
else if (part == "side_wall_tile") side_wall_tile();
else if (part == "rear_wall_tile") rear_wall_tile();
else if (part == "receiving_chute_tile") receiving_chute_tile();
else if (part == "side_flange_segment") side_flange_segment();
else if (part == "rear_flange_segment") rear_flange_segment();
else if (part == "corner_guard") corner_guard();
else if (part == "center_lip") center_lip();
else if (part == "carry_handle") carry_handle();
else if (part == "drop_strut") drop_strut();
else if (part == "joiner_plate") joiner_plate();
else printable_layout();
